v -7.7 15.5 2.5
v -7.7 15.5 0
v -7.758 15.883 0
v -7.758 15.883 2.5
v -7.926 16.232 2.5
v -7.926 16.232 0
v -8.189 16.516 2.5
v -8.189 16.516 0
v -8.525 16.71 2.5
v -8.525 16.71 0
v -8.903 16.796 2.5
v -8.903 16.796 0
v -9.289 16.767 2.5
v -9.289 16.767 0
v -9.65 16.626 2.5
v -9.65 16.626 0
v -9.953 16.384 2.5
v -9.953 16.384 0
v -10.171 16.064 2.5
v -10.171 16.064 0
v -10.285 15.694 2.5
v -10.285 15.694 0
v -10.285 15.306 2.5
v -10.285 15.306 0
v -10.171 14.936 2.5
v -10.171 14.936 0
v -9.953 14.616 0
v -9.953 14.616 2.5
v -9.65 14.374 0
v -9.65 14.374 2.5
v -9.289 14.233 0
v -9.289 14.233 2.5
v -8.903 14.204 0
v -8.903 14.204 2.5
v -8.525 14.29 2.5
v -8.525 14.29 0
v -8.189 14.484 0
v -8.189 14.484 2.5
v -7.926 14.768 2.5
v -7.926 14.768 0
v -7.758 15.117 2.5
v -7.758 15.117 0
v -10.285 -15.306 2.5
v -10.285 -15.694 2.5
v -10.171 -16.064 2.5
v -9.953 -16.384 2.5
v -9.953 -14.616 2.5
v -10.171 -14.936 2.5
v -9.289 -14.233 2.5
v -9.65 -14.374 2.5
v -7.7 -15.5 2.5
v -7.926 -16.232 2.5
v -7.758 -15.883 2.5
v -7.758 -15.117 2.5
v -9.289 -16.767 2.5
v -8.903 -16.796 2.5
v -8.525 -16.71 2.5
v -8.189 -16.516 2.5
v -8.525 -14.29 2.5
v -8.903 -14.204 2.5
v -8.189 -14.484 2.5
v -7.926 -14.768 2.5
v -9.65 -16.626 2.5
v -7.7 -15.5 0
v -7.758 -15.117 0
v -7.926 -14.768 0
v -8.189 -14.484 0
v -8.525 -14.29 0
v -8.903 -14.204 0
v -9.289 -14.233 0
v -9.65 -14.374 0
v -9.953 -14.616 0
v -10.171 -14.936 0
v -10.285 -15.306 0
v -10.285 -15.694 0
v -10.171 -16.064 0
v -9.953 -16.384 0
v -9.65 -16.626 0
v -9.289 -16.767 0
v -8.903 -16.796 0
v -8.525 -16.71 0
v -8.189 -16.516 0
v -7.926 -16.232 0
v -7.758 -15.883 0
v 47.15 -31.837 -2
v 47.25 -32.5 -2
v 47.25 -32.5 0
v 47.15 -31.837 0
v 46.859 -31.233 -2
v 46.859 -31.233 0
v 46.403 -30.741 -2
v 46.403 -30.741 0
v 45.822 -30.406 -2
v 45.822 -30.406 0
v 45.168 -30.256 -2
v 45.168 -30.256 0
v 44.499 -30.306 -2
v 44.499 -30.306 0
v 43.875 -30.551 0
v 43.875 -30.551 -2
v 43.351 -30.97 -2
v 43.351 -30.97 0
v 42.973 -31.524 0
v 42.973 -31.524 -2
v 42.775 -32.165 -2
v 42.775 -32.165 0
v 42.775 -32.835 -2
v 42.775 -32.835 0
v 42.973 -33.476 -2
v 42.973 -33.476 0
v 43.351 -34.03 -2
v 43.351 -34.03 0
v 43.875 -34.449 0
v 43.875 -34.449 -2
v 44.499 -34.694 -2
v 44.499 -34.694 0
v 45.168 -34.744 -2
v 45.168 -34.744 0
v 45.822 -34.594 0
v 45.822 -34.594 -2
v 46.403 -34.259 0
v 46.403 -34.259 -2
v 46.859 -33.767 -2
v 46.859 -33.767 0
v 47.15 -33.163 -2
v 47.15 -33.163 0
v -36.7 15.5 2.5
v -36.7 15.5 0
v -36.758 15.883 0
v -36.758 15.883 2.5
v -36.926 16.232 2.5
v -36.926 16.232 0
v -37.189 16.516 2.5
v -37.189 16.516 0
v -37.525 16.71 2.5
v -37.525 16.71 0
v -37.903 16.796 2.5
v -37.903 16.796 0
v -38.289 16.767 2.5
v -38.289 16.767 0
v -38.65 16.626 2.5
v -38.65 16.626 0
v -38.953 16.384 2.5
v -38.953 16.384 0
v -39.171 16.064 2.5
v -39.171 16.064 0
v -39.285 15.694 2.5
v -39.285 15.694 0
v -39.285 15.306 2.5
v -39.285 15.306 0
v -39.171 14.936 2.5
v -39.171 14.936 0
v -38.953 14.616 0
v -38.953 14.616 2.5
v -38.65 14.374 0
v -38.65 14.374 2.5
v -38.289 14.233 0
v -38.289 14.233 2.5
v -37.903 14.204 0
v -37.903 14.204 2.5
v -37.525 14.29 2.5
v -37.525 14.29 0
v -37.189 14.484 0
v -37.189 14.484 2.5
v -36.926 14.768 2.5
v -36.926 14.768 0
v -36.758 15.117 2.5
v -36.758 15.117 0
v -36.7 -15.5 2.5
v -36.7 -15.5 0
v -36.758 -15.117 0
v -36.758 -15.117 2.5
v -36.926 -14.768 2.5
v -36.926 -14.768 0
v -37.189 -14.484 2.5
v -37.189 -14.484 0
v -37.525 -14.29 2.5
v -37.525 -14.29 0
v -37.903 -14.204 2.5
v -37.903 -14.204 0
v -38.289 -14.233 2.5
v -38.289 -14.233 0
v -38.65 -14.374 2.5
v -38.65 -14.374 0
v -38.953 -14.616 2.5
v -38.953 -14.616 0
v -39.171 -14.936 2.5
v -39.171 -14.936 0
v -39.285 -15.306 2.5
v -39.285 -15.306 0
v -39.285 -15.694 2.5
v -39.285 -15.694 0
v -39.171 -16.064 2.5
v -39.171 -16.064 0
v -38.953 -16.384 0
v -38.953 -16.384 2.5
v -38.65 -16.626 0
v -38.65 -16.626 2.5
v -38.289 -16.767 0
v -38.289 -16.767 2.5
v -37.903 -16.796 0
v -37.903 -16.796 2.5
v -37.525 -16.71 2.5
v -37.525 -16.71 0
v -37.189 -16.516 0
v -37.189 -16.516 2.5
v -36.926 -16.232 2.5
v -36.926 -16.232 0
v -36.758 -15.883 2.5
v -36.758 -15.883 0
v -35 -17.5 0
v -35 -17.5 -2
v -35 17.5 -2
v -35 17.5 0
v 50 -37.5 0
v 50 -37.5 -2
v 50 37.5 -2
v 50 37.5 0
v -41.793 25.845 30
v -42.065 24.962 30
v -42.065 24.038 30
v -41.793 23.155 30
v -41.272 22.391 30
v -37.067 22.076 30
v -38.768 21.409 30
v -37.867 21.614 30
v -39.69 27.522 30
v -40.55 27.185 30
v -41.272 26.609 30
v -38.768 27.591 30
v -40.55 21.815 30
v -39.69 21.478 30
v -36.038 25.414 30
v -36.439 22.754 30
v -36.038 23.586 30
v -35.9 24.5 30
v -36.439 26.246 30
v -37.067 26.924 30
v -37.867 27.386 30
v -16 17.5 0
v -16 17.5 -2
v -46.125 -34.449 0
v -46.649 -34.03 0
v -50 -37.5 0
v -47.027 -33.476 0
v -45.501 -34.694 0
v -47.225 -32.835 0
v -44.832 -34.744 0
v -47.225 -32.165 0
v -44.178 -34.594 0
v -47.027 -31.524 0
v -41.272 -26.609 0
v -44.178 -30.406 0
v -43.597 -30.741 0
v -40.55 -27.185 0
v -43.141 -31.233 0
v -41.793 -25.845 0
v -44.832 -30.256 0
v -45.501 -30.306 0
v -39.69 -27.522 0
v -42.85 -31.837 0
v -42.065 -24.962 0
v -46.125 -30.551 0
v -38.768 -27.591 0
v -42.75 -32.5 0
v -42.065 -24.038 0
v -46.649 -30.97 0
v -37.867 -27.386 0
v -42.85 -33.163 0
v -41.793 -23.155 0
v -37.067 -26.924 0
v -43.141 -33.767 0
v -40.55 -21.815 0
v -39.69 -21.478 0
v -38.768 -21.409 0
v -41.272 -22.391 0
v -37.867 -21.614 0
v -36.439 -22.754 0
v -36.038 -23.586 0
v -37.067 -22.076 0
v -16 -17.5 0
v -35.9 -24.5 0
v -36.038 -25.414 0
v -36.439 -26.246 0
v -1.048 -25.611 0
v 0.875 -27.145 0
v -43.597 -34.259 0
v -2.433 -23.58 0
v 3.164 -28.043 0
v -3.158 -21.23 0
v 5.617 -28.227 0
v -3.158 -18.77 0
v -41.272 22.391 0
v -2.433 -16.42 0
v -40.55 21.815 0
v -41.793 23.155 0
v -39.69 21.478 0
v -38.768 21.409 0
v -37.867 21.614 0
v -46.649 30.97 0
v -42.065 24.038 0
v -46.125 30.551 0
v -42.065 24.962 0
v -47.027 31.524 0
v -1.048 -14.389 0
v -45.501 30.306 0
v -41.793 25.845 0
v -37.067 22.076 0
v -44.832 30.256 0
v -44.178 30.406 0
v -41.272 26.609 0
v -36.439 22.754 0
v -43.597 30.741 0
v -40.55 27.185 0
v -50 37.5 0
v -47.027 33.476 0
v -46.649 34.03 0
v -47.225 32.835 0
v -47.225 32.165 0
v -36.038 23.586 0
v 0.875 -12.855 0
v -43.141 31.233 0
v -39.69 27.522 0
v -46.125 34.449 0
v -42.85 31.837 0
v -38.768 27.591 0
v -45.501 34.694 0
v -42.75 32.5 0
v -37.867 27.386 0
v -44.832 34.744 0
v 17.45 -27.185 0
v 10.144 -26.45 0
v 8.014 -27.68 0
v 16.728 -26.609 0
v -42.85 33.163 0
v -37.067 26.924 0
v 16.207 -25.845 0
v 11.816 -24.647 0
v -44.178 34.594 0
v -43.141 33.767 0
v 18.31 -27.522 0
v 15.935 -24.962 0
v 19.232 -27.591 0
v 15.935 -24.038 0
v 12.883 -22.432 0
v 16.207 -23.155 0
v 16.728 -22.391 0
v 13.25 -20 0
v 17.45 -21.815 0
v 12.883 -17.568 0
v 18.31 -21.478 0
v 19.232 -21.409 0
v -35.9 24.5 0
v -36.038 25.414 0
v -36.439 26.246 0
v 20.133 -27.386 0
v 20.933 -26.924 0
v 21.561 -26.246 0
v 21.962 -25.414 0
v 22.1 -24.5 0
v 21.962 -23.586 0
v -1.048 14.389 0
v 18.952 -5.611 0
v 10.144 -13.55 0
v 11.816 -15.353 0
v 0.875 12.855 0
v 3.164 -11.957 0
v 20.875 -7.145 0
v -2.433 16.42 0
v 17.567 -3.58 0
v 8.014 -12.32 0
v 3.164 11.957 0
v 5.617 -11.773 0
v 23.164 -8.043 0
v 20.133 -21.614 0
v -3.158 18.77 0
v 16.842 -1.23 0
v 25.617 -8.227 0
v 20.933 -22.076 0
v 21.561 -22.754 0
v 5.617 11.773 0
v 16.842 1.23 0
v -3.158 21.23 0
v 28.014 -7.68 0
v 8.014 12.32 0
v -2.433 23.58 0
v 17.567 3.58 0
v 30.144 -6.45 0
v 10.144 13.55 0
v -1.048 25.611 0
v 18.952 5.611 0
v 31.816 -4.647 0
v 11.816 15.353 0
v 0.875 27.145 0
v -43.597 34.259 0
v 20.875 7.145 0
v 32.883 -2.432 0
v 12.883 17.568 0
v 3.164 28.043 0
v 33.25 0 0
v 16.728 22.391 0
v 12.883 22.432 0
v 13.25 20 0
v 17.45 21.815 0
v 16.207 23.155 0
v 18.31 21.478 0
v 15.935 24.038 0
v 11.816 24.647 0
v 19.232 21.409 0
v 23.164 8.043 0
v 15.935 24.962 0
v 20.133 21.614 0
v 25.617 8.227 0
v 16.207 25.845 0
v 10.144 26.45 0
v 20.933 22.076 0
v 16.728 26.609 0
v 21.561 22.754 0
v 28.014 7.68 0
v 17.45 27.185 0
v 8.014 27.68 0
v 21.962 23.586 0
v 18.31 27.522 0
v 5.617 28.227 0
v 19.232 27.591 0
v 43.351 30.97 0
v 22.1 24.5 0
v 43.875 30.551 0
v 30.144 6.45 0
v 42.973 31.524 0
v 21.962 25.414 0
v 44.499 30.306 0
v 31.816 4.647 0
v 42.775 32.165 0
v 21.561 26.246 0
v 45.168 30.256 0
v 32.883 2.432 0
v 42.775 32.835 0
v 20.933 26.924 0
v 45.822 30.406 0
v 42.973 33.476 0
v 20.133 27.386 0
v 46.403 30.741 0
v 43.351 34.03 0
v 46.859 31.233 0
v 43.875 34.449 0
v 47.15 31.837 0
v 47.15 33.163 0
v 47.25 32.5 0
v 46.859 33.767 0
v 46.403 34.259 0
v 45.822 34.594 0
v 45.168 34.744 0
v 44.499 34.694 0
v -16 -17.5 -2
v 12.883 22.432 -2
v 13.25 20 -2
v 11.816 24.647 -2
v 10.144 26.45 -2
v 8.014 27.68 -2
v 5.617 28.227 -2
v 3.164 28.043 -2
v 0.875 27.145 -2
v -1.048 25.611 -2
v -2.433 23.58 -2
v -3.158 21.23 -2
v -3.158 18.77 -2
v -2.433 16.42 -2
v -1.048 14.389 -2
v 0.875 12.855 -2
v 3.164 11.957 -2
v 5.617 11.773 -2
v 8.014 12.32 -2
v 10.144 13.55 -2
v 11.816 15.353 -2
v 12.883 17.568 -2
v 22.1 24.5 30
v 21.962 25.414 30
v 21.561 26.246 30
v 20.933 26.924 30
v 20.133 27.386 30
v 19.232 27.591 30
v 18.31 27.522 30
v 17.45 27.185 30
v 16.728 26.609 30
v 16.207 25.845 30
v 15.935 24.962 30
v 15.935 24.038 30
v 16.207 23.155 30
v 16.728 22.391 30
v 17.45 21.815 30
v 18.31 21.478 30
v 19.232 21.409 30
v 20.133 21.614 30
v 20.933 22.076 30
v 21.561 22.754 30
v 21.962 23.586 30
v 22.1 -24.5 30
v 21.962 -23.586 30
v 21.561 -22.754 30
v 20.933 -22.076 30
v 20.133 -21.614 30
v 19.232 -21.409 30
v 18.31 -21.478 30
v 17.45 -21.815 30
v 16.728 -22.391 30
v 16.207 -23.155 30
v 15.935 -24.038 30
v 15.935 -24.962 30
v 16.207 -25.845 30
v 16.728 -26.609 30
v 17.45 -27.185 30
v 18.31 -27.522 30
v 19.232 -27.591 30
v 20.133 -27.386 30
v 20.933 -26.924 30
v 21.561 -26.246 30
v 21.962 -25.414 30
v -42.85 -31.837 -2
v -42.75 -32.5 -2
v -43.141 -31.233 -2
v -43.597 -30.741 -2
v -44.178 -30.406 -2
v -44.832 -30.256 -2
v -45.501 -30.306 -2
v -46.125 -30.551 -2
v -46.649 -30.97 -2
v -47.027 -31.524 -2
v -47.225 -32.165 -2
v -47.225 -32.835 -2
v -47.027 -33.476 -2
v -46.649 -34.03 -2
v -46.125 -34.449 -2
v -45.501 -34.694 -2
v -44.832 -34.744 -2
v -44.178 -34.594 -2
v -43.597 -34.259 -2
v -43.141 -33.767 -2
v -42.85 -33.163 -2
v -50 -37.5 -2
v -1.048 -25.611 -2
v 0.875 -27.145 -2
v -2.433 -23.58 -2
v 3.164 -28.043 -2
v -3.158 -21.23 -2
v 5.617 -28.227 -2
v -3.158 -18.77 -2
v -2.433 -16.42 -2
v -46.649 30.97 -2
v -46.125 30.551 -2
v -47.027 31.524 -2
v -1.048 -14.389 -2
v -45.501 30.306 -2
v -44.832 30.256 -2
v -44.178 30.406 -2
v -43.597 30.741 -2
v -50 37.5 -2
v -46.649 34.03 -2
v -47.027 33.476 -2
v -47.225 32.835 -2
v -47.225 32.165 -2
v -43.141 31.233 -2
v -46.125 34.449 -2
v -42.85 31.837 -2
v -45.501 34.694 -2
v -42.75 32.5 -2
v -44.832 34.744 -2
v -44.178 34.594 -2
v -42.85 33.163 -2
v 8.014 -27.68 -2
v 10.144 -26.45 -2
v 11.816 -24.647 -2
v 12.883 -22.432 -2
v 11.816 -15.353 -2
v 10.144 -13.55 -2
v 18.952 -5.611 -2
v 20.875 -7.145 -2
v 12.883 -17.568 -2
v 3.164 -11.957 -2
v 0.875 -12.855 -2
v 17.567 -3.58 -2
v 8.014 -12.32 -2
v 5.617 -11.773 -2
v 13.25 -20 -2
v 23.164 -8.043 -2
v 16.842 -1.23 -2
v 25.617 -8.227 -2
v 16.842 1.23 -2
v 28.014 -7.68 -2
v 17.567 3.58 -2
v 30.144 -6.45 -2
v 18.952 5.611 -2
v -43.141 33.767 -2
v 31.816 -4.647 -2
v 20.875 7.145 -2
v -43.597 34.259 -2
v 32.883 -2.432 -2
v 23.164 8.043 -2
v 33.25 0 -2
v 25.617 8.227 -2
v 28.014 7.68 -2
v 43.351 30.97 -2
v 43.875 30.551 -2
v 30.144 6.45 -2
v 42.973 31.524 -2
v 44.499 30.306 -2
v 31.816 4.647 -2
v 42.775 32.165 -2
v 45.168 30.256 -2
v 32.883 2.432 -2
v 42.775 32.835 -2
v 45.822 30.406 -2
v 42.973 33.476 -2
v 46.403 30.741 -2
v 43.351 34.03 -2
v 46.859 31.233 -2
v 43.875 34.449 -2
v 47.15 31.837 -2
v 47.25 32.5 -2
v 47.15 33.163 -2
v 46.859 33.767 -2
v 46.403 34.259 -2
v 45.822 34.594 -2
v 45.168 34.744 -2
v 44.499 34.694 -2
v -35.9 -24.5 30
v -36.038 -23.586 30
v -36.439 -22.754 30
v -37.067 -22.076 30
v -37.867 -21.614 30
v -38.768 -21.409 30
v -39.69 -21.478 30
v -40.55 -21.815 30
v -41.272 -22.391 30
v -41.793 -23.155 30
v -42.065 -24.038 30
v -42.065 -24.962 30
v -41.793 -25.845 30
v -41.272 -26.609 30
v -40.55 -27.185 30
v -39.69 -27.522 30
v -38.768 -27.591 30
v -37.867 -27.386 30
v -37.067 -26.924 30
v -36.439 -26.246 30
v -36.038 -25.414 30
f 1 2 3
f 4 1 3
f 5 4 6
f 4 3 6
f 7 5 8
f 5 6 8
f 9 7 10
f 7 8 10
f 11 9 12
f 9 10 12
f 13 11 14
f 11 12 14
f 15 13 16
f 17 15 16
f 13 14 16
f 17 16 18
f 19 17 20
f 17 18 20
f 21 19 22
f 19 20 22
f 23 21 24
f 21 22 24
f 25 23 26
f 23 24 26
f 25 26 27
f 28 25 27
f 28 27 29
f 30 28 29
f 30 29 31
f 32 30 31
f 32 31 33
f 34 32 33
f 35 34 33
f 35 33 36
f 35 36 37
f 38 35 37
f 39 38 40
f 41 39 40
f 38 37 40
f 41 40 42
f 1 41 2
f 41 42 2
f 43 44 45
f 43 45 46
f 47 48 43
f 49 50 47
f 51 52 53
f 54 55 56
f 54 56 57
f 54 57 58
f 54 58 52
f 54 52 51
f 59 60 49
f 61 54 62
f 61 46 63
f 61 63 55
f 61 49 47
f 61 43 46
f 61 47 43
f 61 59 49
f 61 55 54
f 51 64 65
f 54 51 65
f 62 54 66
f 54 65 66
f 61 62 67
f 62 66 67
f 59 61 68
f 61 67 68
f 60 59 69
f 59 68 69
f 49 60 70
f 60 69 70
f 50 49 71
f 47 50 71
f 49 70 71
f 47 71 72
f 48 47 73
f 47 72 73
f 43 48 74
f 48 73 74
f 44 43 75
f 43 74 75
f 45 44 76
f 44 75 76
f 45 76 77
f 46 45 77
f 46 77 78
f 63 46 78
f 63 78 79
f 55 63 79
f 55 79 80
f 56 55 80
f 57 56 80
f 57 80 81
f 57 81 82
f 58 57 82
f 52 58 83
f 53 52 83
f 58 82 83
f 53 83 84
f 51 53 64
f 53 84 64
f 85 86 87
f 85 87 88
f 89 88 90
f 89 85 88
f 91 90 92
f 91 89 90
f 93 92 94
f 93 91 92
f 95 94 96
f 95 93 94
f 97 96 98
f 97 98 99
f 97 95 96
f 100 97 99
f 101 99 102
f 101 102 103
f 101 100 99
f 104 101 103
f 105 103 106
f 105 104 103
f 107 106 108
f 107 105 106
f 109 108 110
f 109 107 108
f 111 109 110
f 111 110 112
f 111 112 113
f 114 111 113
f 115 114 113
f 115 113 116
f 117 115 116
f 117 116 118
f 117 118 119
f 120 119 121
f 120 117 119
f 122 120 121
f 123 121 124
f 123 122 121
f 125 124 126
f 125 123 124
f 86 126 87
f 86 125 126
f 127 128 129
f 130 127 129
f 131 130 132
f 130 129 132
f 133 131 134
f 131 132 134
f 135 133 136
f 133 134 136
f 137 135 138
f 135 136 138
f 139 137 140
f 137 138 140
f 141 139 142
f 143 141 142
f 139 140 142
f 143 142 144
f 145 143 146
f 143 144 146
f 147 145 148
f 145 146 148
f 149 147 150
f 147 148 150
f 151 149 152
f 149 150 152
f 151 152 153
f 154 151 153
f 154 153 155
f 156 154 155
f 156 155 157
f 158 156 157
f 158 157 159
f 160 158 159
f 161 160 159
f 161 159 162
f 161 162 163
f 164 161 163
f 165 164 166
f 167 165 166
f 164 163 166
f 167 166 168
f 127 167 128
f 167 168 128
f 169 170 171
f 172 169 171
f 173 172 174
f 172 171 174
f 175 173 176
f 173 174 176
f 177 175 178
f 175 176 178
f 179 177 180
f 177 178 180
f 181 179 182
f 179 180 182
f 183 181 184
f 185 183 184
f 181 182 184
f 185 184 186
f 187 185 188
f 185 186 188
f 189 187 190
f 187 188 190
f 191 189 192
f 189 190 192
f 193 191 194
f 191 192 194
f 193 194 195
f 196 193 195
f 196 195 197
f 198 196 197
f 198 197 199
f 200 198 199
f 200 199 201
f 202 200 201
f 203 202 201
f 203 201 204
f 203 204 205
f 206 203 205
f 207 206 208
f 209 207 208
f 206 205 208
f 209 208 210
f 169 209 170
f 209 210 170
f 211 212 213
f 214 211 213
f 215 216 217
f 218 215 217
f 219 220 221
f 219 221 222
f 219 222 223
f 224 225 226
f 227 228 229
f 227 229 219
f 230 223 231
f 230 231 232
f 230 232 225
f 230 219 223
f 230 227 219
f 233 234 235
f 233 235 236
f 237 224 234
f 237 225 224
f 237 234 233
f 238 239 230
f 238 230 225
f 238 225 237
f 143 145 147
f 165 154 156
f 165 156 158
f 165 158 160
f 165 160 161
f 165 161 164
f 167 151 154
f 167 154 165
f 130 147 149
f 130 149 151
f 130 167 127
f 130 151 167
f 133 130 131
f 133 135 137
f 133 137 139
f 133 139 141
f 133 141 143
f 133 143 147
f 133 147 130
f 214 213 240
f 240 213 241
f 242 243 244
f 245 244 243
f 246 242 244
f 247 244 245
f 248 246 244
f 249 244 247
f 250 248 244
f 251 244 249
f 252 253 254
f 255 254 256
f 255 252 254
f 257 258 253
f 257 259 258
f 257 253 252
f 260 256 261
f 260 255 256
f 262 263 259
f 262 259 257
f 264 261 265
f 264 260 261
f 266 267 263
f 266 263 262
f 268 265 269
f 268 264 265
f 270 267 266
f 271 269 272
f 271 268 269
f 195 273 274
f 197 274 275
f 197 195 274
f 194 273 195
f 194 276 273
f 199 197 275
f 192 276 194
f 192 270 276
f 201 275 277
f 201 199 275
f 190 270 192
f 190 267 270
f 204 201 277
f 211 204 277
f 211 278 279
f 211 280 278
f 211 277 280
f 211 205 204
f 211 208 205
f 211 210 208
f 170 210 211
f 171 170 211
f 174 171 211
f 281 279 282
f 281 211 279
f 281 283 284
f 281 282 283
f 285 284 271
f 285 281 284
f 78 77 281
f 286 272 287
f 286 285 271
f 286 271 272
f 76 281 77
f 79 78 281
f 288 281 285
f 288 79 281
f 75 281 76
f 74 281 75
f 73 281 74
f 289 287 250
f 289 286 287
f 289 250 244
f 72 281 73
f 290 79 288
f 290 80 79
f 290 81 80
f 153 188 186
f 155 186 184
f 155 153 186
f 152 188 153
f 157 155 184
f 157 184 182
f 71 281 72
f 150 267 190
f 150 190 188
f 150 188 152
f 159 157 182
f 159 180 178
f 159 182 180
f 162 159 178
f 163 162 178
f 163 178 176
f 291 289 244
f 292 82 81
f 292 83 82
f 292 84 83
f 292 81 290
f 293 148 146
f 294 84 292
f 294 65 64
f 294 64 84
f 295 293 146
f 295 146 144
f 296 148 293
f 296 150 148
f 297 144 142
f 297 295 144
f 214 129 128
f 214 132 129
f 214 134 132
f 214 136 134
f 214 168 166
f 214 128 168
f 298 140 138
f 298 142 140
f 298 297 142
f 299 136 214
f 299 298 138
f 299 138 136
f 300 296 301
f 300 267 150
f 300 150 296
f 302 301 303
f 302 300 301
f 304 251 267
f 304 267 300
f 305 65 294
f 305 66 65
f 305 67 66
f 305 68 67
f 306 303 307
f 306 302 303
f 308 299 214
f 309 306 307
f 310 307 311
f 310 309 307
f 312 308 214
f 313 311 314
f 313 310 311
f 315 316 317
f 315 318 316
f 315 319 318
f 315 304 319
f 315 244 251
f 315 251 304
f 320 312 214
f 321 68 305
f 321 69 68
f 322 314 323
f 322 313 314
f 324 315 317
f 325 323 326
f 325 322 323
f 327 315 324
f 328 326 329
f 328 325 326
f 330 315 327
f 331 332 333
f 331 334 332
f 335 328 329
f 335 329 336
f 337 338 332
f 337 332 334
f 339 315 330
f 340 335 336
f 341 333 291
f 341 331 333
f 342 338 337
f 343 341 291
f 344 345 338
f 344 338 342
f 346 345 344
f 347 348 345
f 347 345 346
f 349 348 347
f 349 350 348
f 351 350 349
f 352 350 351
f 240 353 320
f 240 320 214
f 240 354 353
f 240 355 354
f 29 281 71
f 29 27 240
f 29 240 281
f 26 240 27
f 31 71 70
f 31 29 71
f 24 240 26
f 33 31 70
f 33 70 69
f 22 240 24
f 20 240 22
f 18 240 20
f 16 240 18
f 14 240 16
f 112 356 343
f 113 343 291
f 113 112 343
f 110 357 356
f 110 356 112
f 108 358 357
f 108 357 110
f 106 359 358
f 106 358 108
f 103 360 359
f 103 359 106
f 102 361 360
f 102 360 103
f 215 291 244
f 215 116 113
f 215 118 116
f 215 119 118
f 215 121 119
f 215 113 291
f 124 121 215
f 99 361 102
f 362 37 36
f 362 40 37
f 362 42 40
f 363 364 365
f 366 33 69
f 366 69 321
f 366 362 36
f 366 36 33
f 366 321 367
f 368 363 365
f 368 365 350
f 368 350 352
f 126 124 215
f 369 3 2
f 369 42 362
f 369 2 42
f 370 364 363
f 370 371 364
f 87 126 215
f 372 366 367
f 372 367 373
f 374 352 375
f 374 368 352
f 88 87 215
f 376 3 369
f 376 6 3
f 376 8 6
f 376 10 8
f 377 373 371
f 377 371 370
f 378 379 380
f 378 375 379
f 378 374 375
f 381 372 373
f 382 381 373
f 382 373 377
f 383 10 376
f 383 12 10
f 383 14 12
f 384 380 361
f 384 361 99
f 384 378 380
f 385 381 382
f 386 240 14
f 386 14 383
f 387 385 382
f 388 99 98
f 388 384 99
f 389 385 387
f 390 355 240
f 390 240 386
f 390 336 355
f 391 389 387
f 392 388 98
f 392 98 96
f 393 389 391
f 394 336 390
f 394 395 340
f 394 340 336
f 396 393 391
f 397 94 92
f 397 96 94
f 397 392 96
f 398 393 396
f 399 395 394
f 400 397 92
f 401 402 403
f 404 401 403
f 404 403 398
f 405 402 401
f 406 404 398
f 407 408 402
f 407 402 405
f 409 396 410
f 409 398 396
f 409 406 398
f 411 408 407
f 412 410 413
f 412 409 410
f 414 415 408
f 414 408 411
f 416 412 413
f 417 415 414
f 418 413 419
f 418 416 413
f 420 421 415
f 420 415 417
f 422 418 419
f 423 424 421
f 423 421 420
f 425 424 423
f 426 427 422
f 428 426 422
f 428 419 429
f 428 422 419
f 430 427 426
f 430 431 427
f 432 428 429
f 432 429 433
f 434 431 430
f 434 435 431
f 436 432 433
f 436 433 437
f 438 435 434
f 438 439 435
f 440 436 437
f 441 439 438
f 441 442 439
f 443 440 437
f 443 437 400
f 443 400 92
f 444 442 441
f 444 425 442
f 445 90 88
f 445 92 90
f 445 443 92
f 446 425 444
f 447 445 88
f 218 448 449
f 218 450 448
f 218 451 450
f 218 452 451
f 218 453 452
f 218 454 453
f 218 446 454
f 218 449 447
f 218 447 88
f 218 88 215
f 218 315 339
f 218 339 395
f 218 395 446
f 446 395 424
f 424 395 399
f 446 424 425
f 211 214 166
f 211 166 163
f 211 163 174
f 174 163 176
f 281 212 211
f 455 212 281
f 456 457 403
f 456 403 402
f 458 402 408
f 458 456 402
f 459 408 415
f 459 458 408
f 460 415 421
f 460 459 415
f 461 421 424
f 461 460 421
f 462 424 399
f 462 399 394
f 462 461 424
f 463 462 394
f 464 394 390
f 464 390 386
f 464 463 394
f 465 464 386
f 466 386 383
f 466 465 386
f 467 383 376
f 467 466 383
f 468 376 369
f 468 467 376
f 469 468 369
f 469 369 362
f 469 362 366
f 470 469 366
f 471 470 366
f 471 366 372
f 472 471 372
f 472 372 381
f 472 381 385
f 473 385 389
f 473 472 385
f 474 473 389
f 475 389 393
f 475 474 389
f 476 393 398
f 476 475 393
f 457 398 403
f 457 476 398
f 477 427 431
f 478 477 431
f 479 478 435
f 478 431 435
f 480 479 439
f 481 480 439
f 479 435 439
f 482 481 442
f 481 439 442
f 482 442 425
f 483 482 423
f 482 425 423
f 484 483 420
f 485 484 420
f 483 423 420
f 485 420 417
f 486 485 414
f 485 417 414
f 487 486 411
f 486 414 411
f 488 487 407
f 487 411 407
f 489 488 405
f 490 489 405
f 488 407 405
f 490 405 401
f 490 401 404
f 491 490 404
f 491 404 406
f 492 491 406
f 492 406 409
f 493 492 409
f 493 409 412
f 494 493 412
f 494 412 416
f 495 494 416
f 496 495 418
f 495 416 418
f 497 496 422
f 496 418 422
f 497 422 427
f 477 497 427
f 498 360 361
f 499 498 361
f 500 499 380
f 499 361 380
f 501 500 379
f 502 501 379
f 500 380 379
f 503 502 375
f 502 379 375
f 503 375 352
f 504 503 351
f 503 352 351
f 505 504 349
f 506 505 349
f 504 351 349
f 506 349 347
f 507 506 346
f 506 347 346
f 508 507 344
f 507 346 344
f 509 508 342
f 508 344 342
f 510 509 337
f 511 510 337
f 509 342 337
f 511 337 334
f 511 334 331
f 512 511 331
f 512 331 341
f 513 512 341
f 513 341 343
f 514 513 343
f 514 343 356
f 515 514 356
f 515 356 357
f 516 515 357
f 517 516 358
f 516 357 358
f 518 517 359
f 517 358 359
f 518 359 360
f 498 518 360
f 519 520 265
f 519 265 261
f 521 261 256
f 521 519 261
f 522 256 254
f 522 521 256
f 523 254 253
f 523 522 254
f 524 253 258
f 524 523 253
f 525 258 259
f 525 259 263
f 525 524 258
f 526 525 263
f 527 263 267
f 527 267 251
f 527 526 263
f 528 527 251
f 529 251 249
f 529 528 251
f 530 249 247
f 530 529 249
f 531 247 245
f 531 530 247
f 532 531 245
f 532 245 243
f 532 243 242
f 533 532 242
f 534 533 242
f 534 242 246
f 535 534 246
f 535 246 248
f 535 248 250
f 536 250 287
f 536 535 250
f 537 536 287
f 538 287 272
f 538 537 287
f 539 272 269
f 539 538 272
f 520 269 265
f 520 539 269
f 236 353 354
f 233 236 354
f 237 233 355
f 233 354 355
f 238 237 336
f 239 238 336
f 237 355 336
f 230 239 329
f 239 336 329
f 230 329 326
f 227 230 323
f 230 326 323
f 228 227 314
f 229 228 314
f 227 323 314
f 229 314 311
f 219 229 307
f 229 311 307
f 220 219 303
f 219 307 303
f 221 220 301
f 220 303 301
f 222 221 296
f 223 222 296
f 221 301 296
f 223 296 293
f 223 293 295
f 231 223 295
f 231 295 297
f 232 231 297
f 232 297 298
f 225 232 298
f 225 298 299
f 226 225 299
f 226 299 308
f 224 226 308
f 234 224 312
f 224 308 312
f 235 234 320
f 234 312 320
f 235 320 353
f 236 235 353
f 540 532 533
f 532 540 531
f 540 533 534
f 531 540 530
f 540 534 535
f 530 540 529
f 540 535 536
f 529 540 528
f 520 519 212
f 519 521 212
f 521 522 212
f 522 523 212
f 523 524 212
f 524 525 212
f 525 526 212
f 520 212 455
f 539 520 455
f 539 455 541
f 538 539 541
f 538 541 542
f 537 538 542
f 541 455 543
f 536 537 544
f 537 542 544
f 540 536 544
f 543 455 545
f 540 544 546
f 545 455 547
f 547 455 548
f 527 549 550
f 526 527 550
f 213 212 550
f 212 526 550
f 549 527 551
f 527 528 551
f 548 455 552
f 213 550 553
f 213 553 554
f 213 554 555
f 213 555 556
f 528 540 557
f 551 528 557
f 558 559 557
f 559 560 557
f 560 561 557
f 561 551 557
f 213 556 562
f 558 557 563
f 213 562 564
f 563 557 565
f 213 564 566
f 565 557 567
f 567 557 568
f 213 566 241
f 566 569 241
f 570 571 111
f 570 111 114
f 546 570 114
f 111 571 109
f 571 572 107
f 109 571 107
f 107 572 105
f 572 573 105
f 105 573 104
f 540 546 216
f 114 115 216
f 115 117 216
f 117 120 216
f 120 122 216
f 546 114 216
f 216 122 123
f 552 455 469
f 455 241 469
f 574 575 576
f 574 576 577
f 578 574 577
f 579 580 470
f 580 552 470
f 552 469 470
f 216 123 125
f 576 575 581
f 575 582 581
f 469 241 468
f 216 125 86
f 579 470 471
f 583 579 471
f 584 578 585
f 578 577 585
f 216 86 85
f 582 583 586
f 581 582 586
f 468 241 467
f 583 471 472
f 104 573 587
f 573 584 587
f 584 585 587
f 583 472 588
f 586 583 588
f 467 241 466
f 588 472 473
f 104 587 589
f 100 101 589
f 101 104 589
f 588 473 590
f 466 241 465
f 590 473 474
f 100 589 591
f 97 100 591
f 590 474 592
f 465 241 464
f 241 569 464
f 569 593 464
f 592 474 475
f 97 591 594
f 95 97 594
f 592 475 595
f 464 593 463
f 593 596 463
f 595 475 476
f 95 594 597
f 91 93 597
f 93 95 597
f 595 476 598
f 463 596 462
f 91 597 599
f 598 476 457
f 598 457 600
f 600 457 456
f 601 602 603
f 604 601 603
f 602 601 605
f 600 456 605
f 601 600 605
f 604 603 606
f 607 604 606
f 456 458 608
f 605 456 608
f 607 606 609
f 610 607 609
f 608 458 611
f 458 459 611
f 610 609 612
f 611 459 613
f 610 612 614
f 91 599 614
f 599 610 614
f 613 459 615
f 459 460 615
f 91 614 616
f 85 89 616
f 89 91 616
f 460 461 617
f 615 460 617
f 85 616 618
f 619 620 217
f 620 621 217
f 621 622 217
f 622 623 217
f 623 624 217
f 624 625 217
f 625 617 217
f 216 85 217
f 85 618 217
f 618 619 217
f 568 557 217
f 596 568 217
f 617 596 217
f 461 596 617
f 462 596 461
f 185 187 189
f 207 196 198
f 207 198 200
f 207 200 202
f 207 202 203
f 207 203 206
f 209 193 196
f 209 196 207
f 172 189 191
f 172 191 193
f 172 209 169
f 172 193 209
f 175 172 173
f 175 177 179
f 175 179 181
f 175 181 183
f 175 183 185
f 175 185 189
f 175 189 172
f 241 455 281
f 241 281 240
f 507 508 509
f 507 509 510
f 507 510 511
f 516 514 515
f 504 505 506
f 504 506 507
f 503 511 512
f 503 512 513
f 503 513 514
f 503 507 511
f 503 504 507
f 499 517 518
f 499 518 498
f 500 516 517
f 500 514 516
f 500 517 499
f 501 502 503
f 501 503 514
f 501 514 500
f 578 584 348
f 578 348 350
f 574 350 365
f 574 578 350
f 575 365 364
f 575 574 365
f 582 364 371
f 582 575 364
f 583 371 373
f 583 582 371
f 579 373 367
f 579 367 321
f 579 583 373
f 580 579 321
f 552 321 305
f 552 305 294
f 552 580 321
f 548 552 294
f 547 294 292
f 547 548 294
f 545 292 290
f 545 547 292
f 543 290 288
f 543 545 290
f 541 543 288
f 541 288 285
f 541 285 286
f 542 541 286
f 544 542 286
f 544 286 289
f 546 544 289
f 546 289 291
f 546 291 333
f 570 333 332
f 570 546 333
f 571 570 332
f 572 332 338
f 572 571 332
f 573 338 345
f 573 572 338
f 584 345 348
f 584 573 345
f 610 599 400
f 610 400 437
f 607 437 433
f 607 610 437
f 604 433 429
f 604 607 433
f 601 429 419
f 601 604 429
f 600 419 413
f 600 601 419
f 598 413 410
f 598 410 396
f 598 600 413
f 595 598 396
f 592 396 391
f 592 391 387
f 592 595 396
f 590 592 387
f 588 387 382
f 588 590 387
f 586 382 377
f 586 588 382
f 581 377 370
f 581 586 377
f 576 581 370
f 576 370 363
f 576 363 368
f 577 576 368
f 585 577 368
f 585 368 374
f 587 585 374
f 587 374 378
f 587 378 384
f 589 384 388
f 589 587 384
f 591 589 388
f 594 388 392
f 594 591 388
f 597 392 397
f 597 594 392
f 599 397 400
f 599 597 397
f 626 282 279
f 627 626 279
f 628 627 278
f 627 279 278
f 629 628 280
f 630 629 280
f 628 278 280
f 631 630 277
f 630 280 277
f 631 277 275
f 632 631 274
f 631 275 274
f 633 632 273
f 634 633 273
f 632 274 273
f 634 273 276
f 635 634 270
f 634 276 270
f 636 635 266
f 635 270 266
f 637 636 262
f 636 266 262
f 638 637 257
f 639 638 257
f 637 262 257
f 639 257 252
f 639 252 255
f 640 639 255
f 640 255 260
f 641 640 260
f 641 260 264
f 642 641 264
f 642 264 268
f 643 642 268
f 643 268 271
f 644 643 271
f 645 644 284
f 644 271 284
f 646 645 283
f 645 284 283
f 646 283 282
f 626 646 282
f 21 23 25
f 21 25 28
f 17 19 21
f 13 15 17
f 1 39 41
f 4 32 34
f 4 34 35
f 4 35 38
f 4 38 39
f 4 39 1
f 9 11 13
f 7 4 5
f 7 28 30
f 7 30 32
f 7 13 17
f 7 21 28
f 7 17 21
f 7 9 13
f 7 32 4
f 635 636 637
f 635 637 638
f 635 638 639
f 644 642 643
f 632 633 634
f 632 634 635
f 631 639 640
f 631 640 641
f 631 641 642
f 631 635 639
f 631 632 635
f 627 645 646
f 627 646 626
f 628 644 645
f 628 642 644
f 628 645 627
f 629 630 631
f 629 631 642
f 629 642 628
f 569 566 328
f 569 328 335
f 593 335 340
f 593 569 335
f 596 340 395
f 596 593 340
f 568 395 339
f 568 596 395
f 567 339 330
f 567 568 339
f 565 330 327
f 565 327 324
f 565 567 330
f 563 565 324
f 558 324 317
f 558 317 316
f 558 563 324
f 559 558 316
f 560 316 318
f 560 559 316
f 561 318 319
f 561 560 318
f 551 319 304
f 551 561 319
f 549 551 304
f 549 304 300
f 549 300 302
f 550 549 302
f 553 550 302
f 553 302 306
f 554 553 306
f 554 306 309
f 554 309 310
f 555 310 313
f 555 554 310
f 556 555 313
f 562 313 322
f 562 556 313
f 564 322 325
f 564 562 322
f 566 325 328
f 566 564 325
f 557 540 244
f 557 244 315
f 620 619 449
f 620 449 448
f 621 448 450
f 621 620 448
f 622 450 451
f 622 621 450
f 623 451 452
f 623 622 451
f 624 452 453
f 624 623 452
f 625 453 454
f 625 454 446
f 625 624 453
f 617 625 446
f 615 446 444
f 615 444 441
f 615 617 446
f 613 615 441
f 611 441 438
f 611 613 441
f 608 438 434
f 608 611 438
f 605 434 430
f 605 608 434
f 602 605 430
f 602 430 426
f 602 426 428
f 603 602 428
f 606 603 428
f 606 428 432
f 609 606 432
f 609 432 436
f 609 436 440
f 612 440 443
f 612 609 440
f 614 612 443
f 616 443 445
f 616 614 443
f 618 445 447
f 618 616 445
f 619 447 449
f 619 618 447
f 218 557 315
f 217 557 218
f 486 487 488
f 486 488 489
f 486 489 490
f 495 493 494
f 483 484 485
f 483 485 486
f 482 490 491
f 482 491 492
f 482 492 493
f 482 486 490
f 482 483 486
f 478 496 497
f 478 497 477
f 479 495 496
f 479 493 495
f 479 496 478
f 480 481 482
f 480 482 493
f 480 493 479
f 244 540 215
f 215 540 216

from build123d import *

# Parameters (mm, degrees)
SKETCH_W     = 100
SKETCH_H     = 75
SKETCH_R     = 8.25
SKETCH_R_2   = 2.25
SKETCH_W_2   = 19
SKETCH_H_2   = 35
PAD001_DEPTH = 2
SKETCH008_R  = 1.3
PAD006_DEPTH = 2.5
SKETCH009_R  = 3.1
PAD007_DEPTH = 30


with BuildPart() as part:
    # Sketch → Pad001 (new body)
    with BuildSketch(Plane.XY):
        Rectangle(SKETCH_W, SKETCH_H)
        with Locations((5, 20)):
            Circle(SKETCH_R, mode=Mode.SUBTRACT)
        with Locations((5, -20)):
            Circle(SKETCH_R, mode=Mode.SUBTRACT)
        with Locations((-45, 32.5)):
            Circle(SKETCH_R_2, mode=Mode.SUBTRACT)
        with Locations((-45, -32.5)):
            Circle(SKETCH_R_2, mode=Mode.SUBTRACT)
        with Locations((45, 32.5)):
            Circle(SKETCH_R_2, mode=Mode.SUBTRACT)
        with Locations((45, -32.5)):
            Circle(SKETCH_R_2, mode=Mode.SUBTRACT)
        with Locations((25, 0)):
            Circle(SKETCH_R, mode=Mode.SUBTRACT)
        with Locations((-25.5, 0)):
            Rectangle(SKETCH_W_2, SKETCH_H_2, mode=Mode.SUBTRACT)
    extrude(amount=PAD001_DEPTH)

    # Sketch008 (on Face17 of Pad001) → Pad006 (join)
    with BuildSketch(Plane.XY.offset(2)):
        with Locations((-38, 15.5)):
            Circle(SKETCH008_R)
        with Locations((-9, 15.5)):
            Circle(SKETCH008_R)
        with Locations((-38, -15.5)):
            Circle(SKETCH008_R)
        with Locations((-9, -15.5)):
            Circle(SKETCH008_R)
    extrude(amount=PAD006_DEPTH)

    # Sketch009 (on Face5 of Pad006) → Pad007 (join)
    with BuildSketch(Plane.XY.offset(2)):
        with Locations((19, 24.5)):
            Circle(SKETCH009_R)
        with Locations((-39, 24.5)):
            Circle(SKETCH009_R)
        with Locations((-39, -24.5)):
            Circle(SKETCH009_R)
        with Locations((19, -24.5)):
            Circle(SKETCH009_R)
    extrude(amount=PAD007_DEPTH)


with BuildPart() as part_1:
    # Body placement: moved
    add(part.part.moved(Location((0, 0, -2))))


solid = part_1.part
